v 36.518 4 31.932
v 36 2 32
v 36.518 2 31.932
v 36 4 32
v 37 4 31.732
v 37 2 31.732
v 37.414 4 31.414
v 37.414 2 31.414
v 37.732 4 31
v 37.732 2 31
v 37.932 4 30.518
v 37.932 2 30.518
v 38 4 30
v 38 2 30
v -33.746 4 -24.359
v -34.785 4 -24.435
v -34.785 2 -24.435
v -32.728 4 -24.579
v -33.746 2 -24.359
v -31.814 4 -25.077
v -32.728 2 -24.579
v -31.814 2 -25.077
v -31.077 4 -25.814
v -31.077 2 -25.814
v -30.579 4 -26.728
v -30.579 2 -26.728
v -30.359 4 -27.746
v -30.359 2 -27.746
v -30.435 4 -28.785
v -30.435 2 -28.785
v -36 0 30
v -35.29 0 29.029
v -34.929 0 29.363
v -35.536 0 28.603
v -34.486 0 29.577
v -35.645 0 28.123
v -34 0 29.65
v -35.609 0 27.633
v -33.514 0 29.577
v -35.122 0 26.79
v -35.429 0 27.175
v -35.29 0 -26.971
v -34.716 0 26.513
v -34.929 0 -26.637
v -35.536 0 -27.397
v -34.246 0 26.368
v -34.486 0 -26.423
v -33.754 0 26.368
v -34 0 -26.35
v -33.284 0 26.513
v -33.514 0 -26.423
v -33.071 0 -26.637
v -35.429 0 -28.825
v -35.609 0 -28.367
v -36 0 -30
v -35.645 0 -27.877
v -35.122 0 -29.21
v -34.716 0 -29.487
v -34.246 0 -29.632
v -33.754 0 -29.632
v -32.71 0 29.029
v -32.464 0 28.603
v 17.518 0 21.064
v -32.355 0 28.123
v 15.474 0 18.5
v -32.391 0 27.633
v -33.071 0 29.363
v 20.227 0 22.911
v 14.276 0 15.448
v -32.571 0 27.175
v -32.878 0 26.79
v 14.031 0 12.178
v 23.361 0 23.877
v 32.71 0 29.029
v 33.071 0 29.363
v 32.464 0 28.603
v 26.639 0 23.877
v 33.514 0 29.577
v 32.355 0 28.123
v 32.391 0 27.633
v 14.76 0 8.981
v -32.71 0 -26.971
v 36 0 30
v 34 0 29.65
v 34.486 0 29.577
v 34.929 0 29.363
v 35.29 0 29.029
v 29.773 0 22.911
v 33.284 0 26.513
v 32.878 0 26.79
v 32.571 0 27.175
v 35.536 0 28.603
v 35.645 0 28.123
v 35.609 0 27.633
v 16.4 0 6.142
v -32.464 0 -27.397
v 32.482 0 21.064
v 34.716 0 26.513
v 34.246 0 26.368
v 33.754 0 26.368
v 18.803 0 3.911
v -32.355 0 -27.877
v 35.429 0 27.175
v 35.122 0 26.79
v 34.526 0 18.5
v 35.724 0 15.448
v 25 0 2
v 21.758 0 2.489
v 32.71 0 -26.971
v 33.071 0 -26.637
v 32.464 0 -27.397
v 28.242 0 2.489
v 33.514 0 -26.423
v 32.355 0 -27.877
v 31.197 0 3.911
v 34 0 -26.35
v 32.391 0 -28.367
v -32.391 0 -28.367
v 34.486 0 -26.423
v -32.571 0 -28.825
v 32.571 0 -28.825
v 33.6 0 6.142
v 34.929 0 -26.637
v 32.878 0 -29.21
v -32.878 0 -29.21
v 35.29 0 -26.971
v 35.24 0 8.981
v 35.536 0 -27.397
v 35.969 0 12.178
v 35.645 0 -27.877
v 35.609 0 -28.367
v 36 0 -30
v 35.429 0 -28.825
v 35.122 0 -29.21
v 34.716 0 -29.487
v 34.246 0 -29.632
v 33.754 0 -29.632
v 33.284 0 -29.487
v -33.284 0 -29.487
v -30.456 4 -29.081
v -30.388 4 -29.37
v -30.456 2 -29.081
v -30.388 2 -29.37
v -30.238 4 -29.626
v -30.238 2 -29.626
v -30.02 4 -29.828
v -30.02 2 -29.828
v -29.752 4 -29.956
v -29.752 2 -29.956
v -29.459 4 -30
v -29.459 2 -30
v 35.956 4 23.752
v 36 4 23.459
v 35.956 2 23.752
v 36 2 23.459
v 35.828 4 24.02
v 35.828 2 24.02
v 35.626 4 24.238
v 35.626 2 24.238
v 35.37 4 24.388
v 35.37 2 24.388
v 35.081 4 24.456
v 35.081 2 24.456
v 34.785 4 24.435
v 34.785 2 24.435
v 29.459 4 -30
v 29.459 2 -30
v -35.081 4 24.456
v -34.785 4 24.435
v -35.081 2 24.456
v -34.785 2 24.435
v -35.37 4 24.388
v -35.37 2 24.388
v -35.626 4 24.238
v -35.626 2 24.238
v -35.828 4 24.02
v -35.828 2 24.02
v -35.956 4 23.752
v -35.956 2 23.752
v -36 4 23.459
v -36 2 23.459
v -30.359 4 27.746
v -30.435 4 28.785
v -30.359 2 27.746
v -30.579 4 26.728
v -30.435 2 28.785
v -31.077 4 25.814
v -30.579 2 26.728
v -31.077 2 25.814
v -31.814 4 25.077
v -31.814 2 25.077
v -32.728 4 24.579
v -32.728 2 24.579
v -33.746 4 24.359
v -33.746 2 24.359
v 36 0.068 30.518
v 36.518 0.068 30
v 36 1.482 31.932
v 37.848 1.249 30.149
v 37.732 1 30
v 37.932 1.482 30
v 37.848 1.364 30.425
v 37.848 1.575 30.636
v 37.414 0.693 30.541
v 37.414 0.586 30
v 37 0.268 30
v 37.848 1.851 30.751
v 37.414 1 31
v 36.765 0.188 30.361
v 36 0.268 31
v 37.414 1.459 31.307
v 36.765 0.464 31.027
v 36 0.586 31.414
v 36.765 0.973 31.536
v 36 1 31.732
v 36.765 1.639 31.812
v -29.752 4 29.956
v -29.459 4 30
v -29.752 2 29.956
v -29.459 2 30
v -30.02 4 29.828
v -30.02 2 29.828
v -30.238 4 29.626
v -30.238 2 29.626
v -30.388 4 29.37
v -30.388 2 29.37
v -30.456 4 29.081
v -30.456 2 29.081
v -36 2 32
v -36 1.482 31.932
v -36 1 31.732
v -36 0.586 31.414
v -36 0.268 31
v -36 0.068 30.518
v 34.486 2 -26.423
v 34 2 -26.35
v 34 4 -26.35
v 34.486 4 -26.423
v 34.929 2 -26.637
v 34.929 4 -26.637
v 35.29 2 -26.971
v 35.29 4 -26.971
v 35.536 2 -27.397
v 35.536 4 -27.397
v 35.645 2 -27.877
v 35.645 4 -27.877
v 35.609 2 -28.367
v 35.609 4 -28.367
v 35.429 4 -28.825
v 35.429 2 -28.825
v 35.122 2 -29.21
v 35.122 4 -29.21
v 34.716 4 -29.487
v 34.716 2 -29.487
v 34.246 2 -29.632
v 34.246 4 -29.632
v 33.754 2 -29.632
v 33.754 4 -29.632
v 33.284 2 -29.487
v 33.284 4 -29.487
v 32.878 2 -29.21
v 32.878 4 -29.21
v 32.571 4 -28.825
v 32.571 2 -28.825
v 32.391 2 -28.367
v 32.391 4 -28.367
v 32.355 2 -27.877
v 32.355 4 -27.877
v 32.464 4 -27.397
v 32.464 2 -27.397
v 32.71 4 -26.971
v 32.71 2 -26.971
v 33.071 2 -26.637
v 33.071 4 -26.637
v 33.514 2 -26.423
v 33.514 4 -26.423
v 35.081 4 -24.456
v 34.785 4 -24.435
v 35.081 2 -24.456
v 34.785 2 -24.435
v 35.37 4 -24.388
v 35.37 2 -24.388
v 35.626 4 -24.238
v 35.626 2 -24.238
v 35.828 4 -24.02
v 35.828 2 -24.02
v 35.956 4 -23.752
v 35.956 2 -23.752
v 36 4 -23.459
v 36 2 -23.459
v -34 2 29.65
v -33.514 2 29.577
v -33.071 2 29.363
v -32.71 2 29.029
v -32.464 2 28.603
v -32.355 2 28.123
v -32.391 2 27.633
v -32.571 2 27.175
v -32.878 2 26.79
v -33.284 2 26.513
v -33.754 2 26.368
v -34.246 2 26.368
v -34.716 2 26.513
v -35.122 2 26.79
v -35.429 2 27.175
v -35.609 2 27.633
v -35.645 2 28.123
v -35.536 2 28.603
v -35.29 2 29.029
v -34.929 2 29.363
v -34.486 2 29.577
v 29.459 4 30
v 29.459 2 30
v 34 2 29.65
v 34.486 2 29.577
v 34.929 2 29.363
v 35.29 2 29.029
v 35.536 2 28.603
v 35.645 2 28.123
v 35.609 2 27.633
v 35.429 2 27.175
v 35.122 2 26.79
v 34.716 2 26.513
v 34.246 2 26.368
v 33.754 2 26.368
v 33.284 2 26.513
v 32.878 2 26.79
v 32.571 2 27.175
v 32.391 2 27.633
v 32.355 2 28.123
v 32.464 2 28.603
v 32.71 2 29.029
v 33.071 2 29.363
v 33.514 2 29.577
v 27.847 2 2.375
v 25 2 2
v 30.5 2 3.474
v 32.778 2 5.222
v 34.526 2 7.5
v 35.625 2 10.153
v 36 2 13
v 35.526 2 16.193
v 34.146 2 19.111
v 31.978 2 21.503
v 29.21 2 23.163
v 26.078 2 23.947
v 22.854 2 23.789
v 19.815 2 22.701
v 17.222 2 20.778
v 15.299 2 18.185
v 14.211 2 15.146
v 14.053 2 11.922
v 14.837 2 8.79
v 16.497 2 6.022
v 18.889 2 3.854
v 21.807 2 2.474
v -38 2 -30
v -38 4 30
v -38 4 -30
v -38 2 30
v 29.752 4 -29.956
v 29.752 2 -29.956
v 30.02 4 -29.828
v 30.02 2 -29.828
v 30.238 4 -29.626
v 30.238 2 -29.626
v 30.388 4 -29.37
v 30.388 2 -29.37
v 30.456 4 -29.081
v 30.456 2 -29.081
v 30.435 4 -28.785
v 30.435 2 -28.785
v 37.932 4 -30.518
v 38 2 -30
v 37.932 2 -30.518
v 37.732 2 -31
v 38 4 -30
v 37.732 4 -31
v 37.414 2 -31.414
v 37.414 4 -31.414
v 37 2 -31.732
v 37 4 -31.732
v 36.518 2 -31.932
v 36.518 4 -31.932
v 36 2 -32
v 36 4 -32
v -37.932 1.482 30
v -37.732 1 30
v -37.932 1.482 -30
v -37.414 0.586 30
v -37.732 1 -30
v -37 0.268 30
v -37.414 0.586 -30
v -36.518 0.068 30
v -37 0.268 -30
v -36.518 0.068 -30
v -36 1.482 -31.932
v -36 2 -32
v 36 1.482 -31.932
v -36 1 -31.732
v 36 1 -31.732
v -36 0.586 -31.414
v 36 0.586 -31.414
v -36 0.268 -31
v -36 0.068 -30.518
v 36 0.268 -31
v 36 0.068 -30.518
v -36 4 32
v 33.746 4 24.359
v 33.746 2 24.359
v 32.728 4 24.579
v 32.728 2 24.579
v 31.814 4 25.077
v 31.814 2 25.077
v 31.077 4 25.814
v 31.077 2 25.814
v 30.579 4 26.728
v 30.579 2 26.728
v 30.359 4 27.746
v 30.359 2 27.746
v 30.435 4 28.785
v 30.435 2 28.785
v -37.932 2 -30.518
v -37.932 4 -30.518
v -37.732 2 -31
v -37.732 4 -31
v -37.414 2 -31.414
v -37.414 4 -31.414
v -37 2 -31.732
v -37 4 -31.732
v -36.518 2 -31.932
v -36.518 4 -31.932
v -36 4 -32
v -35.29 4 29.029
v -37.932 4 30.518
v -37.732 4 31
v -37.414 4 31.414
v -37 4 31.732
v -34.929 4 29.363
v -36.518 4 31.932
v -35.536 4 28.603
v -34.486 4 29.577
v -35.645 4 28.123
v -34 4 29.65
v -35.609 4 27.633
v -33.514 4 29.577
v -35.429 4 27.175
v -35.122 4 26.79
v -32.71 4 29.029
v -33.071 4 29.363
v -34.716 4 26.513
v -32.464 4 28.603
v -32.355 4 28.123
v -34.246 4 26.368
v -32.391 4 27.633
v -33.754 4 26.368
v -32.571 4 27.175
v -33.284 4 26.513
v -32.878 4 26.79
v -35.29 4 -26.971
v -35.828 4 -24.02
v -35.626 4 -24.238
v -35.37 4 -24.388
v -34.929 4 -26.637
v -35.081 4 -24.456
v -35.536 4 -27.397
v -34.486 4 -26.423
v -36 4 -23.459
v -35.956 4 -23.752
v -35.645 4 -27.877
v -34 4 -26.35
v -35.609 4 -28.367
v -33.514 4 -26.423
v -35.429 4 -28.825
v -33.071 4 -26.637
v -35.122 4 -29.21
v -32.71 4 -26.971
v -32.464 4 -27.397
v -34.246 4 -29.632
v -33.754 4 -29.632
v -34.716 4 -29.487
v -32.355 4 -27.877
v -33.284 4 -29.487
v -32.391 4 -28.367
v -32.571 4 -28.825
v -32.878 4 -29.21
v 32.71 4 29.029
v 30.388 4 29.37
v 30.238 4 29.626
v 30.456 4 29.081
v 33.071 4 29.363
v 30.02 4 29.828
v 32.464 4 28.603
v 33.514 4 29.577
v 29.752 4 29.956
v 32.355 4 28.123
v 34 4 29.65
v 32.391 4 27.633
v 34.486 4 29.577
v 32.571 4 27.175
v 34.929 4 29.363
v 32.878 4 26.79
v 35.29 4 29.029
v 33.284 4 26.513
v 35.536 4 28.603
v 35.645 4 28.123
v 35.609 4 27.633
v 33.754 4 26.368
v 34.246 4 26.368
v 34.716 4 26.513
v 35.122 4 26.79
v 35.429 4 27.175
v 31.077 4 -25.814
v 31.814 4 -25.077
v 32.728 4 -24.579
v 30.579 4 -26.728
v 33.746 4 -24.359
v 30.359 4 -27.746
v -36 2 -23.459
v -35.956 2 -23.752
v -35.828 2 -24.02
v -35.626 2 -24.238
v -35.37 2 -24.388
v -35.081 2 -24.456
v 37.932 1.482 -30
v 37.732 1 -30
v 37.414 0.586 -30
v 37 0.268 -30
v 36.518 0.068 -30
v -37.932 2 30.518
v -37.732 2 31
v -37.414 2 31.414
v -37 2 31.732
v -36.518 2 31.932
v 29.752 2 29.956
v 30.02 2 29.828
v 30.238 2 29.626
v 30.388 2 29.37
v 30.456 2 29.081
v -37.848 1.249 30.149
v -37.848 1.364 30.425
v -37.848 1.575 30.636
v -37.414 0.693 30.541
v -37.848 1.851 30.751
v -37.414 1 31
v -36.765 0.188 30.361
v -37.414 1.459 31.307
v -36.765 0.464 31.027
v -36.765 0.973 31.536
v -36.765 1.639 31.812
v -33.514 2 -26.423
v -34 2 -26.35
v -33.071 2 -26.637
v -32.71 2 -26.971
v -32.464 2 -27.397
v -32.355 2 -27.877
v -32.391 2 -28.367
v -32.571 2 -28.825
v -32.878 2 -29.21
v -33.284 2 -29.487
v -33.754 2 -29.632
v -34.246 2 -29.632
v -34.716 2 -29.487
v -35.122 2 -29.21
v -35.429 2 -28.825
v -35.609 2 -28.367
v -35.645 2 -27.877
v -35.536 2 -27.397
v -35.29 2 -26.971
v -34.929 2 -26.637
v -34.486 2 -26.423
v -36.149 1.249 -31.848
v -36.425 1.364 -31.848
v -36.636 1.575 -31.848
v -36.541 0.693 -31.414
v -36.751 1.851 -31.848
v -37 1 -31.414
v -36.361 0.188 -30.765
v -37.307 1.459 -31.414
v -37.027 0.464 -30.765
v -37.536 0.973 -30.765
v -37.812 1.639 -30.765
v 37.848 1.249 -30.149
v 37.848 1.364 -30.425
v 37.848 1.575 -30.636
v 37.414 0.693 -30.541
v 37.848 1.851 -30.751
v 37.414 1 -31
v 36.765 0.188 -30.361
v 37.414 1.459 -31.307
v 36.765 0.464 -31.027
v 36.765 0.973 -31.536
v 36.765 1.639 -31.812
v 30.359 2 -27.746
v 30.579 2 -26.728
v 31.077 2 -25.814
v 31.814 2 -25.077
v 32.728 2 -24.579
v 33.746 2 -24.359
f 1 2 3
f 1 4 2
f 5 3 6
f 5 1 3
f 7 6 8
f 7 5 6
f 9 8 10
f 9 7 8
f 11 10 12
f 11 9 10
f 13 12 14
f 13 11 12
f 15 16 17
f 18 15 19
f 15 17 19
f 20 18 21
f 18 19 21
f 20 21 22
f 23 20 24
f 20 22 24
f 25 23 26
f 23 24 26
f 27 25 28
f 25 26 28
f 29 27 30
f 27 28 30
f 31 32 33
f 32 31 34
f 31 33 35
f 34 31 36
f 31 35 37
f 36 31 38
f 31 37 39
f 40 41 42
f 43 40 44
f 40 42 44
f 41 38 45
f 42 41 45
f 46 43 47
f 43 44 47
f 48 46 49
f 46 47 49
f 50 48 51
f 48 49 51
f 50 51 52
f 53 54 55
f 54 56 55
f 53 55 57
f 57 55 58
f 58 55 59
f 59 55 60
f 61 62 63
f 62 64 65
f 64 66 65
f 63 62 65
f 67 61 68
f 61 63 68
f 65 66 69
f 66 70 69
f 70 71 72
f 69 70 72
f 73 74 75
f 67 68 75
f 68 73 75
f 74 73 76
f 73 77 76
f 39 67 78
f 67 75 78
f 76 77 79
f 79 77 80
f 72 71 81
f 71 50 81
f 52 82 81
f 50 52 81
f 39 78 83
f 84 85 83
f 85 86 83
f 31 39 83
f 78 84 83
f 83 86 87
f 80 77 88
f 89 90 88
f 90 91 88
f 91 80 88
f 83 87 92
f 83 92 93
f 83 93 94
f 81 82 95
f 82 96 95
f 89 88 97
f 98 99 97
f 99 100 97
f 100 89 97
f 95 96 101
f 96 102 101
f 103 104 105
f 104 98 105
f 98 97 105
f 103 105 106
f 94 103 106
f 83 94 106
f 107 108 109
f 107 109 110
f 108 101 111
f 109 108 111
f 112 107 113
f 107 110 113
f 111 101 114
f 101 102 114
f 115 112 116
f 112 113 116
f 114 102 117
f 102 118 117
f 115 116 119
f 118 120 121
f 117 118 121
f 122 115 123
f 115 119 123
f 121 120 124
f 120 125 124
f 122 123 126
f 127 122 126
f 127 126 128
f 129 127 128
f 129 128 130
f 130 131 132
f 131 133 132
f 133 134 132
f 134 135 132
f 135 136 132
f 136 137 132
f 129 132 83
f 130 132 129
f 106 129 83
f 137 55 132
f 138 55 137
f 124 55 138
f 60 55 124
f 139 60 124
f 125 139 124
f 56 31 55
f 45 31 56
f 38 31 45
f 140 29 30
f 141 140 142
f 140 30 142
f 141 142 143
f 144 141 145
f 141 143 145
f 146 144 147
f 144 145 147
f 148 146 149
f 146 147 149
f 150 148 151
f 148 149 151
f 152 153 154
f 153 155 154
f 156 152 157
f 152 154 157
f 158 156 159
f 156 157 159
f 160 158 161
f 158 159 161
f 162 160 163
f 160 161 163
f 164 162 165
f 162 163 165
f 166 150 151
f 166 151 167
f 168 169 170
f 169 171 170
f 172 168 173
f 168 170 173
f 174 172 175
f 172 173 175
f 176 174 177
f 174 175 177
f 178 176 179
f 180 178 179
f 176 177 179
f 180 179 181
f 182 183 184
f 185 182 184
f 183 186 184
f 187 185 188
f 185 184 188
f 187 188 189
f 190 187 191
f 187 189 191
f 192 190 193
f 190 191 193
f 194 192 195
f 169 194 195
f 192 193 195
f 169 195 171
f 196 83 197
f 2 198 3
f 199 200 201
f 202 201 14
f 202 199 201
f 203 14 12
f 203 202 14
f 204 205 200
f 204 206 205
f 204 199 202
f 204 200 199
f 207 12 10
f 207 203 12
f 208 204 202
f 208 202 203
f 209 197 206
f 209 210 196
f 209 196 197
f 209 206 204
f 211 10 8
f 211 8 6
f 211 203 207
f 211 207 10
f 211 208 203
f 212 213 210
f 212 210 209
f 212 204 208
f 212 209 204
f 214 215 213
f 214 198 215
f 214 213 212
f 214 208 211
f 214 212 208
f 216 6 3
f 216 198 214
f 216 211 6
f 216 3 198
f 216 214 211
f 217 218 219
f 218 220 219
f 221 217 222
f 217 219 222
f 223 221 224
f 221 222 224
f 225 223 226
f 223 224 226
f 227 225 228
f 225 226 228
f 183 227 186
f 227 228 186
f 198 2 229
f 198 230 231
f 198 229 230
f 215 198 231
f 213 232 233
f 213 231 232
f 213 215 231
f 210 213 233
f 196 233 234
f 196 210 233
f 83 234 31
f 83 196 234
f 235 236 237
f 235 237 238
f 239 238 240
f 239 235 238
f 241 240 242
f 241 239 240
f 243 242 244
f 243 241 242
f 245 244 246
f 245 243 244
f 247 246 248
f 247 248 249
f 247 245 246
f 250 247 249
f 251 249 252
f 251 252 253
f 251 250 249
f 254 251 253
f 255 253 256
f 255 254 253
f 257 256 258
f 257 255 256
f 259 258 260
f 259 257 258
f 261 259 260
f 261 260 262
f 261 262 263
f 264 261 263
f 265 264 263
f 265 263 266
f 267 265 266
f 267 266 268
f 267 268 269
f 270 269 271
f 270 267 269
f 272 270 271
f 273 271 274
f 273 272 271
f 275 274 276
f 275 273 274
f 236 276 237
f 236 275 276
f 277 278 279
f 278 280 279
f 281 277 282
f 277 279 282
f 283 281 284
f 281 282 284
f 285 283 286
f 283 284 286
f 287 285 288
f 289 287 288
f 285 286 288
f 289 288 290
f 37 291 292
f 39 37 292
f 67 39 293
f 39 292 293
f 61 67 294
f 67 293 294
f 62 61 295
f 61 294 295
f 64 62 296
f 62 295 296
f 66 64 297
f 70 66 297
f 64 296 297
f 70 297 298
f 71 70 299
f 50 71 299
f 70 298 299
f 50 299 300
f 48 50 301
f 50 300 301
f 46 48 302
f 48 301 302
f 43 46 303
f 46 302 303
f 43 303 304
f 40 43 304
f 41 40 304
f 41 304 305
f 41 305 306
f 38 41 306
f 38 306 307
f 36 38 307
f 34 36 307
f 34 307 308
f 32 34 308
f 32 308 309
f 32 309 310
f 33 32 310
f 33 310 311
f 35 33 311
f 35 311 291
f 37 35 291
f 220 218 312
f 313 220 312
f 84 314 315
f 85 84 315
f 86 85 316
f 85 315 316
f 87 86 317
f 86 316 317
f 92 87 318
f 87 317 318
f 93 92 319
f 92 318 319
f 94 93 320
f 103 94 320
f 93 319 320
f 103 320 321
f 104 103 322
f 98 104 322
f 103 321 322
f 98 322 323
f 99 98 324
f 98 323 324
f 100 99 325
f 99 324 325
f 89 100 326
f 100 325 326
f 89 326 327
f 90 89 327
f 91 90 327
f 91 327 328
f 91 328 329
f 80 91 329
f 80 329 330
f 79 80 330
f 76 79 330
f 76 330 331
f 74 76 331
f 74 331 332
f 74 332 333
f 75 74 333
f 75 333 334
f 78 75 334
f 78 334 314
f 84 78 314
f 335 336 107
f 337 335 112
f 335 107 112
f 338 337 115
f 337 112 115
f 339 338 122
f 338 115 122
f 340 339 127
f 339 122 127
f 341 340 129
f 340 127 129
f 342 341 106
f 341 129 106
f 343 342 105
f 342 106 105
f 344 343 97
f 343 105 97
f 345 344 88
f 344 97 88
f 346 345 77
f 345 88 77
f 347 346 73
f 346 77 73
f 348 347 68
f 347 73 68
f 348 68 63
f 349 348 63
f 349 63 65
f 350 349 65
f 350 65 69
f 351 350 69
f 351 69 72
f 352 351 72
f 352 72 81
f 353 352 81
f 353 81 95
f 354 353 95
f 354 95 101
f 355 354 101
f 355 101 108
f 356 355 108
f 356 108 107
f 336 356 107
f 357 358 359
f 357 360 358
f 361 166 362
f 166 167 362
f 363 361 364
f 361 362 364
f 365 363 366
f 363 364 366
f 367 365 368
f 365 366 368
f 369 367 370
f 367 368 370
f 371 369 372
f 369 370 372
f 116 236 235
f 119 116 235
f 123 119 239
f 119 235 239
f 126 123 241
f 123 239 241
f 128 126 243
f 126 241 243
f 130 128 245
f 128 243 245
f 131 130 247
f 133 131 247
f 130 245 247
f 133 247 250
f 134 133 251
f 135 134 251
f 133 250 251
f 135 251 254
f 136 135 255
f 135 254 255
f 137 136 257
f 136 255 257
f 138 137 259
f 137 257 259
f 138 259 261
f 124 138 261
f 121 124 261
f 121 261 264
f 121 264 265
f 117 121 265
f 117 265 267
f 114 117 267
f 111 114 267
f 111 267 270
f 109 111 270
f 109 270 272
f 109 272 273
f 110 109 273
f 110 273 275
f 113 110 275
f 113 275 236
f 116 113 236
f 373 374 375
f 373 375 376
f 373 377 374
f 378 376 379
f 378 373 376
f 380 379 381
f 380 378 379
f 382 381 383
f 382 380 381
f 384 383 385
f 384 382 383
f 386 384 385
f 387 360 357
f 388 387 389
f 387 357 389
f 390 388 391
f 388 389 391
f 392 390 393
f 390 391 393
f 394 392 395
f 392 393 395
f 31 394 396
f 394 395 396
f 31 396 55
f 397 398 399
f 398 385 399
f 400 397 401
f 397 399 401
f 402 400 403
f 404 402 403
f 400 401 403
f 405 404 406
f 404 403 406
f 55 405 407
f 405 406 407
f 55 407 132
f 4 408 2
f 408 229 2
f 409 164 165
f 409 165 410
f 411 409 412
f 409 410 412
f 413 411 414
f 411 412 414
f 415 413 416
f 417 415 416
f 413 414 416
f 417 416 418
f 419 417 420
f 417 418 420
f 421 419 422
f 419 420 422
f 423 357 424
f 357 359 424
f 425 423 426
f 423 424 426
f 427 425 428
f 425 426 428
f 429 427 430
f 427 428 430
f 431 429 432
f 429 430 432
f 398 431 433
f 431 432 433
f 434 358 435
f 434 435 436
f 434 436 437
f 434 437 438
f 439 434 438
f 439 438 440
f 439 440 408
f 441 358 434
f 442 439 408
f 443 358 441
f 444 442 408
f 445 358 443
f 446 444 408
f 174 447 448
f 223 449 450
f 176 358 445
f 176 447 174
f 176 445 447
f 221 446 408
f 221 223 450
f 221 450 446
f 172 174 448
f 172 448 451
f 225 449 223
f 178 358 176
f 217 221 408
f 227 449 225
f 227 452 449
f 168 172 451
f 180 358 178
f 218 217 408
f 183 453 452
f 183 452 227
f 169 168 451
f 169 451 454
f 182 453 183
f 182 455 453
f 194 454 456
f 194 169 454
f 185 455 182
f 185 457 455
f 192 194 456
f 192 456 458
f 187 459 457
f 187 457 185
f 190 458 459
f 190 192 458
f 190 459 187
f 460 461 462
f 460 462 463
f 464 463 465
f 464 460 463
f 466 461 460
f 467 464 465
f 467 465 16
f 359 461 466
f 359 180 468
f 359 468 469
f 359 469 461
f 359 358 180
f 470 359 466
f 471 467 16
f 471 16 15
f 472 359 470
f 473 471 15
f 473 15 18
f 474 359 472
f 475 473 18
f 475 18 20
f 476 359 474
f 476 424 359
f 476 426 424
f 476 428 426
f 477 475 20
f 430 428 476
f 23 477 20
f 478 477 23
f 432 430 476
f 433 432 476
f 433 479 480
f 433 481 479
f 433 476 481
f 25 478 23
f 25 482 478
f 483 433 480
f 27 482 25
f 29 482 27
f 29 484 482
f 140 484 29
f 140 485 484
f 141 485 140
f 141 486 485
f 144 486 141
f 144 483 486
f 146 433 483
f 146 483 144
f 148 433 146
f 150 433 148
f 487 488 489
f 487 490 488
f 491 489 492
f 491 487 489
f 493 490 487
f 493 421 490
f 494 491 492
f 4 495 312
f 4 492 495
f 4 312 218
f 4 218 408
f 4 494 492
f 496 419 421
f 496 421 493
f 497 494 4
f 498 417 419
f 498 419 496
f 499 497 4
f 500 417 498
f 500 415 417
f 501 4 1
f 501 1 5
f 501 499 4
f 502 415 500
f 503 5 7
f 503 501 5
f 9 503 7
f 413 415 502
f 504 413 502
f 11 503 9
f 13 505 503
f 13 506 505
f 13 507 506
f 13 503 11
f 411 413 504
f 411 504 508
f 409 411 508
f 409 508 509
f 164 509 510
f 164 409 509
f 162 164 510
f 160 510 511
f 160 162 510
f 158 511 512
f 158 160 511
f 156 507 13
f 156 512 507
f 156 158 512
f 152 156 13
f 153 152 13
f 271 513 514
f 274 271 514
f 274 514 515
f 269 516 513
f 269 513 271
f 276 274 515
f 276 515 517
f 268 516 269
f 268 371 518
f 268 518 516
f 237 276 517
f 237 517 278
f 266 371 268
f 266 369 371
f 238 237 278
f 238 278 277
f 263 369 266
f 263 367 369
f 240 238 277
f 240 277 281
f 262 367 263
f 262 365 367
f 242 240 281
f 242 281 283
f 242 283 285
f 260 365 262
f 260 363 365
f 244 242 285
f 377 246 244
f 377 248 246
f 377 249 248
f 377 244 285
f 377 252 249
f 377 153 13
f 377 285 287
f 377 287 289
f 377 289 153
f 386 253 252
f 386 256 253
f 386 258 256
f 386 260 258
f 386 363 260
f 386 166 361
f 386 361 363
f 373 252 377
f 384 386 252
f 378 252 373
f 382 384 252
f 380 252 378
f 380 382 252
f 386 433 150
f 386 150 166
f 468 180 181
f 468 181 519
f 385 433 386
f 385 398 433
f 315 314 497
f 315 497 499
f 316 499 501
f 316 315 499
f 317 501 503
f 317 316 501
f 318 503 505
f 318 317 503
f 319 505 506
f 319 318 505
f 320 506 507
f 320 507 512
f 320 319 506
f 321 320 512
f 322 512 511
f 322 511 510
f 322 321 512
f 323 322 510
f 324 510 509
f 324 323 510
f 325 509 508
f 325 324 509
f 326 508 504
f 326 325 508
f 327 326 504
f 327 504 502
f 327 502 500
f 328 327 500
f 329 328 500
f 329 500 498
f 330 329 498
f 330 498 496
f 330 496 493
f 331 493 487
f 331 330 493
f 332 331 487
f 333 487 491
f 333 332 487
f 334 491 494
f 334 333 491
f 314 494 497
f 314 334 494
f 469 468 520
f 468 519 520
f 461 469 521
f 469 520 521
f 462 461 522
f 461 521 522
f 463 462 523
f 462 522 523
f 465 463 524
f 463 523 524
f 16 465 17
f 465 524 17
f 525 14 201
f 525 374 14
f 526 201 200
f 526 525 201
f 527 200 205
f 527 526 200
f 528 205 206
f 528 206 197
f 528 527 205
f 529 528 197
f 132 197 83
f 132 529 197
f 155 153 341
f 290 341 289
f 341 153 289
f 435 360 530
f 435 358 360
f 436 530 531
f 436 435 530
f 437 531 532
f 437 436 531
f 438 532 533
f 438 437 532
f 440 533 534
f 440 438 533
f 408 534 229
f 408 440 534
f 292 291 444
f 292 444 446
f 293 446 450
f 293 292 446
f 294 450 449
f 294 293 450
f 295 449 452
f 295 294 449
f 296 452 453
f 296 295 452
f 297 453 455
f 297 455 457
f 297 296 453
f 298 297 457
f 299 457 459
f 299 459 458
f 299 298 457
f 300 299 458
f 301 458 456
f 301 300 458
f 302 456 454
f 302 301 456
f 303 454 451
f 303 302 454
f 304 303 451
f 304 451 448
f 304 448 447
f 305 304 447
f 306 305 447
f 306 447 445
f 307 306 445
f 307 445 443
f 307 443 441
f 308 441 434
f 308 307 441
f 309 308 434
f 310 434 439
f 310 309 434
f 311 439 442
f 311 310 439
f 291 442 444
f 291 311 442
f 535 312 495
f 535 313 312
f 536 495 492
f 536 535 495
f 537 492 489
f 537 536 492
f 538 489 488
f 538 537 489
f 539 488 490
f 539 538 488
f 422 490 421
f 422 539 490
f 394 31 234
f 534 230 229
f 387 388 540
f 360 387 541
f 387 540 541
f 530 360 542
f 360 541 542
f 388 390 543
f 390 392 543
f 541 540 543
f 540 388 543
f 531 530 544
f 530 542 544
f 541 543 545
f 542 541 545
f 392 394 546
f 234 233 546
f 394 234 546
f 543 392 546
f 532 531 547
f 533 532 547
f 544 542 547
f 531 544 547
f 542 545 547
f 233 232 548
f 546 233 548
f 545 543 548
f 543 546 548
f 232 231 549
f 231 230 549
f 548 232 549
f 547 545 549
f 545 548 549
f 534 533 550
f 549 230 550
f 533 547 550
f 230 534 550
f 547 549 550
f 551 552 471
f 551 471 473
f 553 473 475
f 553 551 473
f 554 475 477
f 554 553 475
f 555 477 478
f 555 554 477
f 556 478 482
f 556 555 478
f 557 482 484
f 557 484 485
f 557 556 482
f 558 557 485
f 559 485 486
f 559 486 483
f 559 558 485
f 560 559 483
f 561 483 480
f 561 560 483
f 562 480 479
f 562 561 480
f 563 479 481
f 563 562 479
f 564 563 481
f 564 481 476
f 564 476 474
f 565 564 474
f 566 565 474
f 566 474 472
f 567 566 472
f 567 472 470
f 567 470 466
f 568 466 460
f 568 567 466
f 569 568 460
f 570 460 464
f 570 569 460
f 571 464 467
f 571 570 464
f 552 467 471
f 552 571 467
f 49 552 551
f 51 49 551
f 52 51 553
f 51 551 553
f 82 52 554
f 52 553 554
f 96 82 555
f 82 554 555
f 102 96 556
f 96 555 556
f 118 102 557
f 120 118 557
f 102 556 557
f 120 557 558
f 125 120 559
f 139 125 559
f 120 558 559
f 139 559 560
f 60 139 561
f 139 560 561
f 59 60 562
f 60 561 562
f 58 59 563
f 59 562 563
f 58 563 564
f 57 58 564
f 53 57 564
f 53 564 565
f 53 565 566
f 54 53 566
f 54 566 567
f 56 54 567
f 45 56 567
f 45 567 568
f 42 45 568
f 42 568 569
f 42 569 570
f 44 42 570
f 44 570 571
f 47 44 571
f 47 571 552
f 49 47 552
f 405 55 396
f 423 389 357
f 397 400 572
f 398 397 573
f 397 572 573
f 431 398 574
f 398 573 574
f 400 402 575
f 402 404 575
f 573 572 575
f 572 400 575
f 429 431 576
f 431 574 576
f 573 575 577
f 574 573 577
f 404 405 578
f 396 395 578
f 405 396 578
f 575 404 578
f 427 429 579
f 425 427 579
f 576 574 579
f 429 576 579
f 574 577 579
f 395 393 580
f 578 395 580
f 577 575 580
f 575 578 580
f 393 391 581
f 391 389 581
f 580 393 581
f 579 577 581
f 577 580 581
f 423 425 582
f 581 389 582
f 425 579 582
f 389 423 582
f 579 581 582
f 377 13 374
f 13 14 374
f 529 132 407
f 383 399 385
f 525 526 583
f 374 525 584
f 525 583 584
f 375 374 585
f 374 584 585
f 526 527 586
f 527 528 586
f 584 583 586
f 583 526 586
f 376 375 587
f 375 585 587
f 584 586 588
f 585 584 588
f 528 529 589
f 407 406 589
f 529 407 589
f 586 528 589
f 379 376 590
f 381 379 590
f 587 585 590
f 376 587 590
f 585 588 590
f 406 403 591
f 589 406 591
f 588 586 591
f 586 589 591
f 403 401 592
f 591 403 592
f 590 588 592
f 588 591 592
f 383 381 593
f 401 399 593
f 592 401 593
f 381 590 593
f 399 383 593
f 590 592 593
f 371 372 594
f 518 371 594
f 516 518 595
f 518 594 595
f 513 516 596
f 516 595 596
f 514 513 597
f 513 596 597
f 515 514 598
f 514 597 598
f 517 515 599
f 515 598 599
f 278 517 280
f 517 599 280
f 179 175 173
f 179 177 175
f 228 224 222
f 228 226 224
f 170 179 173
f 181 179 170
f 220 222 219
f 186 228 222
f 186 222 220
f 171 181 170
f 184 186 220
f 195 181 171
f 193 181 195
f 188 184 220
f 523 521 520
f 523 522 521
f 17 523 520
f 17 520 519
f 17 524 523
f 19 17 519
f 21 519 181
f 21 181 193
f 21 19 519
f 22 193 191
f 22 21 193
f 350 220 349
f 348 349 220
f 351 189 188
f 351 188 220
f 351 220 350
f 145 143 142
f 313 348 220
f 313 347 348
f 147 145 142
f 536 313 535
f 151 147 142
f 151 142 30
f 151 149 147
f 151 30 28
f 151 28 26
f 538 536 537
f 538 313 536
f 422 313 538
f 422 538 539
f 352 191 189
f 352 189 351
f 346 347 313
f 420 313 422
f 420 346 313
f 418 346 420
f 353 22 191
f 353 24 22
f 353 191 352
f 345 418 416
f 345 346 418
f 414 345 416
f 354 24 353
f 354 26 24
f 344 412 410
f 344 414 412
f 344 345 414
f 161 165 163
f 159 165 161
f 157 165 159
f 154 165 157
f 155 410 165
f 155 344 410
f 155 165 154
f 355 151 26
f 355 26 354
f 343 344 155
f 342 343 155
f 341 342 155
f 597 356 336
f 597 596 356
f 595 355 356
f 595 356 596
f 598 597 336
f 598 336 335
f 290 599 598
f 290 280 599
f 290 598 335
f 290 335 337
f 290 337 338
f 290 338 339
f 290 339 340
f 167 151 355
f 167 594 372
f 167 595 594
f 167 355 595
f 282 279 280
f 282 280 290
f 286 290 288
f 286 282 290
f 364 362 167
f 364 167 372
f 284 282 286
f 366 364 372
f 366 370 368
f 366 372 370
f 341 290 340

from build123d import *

# Parameters (mm, degrees)
SCHIZZO1_W                   = 76
SCHIZZO1_H                   = 64
ESTRUSIONE_ESTRUSIONE1_DEPTH = 4
SCHIZZO2_W                   = 72
SCHIZZO2_H                   = 60
TAGLIO_ESTRUSIONE1_DEPTH     = 2
SCHIZZO3_R                   = 3.65
SCHIZZO3_R_2                 = 1.65
ESTRUSIONE_ESTRUSIONE2_DEPTH = 2
SCHIZZO3_11_R                = 1.65
TAGLIO_ESTRUSIONE4_DEPTH     = 50.719211579
SCHIZZO5_R                   = 11
TAGLIO_ESTRUSIONE5_DEPTH     = 2
RACCORDO1_R                  = 1
RACCORDO2_R                  = 2


with BuildPart() as part:
    # Schizzo1 → Estrusione-Estrusione1 (new body)
    with BuildSketch(Plane(origin=(0, 0, 0), x_dir=(1, 0, 0), z_dir=(0, 1, 0))):
        Rectangle(SCHIZZO1_W, SCHIZZO1_H)
    extrude(amount=ESTRUSIONE_ESTRUSIONE1_DEPTH)

    # Schizzo2 → Taglio-Estrusione1 (cut)
    with BuildSketch(Plane(origin=(0, 4, 0), x_dir=(1, 0, 0), z_dir=(0, 1, 0))):
        Rectangle(SCHIZZO2_W, SCHIZZO2_H)
    extrude(amount=-TAGLIO_ESTRUSIONE1_DEPTH, mode=Mode.SUBTRACT)

    # Schizzo3 → Estrusione-Estrusione2 (add)
    # profile 1 of 4: a face of its own
    with BuildSketch(Plane(origin=(0, 2, 0), x_dir=(1, 0, 0), z_dir=(0, 1, 0))):
        with Locations((34, 28)):
            Circle(SCHIZZO3_R)
        with Locations(Location((34, 28, 0), (0, 0, 270))):
            Circle(SCHIZZO3_R_2, mode=Mode.SUBTRACT)
    # profile 2 of 4: a face of its own
    with BuildSketch(Plane(origin=(0, 2, 0), x_dir=(1, 0, 0), z_dir=(0, 1, 0))):
        with Locations((-34, 28)):
            Circle(SCHIZZO3_R)
        with Locations(Location((-34, 28, 0), (0, 0, 270))):
            Circle(SCHIZZO3_R_2, mode=Mode.SUBTRACT)
    # profile 3 of 4: a face of its own
    with BuildSketch(Plane(origin=(0, 2, 0), x_dir=(1, 0, 0), z_dir=(0, 1, 0))):
        with Locations((34, -28)):
            Circle(SCHIZZO3_R)
        with Locations(Location((34, -28, 0), (0, 0, 270))):
            Circle(SCHIZZO3_R_2, mode=Mode.SUBTRACT)
    # profile 4 of 4: a face of its own
    with BuildSketch(Plane(origin=(0, 2, 0), x_dir=(1, 0, 0), z_dir=(0, 1, 0))):
        with Locations((-34, -28)):
            Circle(SCHIZZO3_R)
        with Locations(Location((-34, -28, 0), (0, 0, 270))):
            Circle(SCHIZZO3_R_2, mode=Mode.SUBTRACT)
    extrude(amount=ESTRUSIONE_ESTRUSIONE2_DEPTH)

    # Schizzo3<11> → Taglio-Estrusione4 (cut, through all)
    with BuildSketch(Plane(origin=(0, 2, 0), x_dir=(1, 0, 0), z_dir=(0, 1, 0))):
        with Locations(Location((-34, 28, 0), (0, 0, 270))):
            Circle(SCHIZZO3_11_R)
        with Locations(Location((-34, -28, 0), (0, 0, 270))):
            Circle(SCHIZZO3_11_R)
        with Locations(Location((34, -28, 0), (0, 0, 270))):
            Circle(SCHIZZO3_11_R)
        with Locations(Location((34, 28, 0), (0, 0, 270))):
            Circle(SCHIZZO3_11_R)
    extrude(amount=-TAGLIO_ESTRUSIONE4_DEPTH, mode=Mode.SUBTRACT)

    # Schizzo5 → Taglio-Estrusione5 (cut)
    with BuildSketch(Plane.XZ):
        with Locations(Location((25, 13, 0), (0, 0, 270))):
            Circle(SCHIZZO5_R)
    extrude(amount=-TAGLIO_ESTRUSIONE5_DEPTH, mode=Mode.SUBTRACT)

    # Raccordo1
    raccordo1_edges = [part.edges().sort_by_distance(p)[0] for p in [
        (30.946723072, 3, -30),
        (36, 3, -24.946723072),
        (-36, 3, -24.946723072),
        (-30.946723072, 3, -30),
        (-30.946723072, 3, 30),
        (-36, 3, 24.946723072),
        (36, 3, 24.946723072),
        (30.946723072, 3, 30),
    ]]
    fillet(raccordo1_edges, radius=RACCORDO1_R)

    # Raccordo2
    raccordo2_edges = [part.edges().sort_by_distance(p)[0] for p in [
        (0, 0, 32),
        (-38, 0, 0),
        (0, 0, -32),
        (38, 0, 0),
        (38, 2, 32),
        (-38, 2, 32),
        (-38, 2, -32),
        (38, 2, -32),
    ]]
    fillet(raccordo2_edges, radius=RACCORDO2_R - 0.0001)  # a hair under: the kernel refuses the full size


solid = part.part
